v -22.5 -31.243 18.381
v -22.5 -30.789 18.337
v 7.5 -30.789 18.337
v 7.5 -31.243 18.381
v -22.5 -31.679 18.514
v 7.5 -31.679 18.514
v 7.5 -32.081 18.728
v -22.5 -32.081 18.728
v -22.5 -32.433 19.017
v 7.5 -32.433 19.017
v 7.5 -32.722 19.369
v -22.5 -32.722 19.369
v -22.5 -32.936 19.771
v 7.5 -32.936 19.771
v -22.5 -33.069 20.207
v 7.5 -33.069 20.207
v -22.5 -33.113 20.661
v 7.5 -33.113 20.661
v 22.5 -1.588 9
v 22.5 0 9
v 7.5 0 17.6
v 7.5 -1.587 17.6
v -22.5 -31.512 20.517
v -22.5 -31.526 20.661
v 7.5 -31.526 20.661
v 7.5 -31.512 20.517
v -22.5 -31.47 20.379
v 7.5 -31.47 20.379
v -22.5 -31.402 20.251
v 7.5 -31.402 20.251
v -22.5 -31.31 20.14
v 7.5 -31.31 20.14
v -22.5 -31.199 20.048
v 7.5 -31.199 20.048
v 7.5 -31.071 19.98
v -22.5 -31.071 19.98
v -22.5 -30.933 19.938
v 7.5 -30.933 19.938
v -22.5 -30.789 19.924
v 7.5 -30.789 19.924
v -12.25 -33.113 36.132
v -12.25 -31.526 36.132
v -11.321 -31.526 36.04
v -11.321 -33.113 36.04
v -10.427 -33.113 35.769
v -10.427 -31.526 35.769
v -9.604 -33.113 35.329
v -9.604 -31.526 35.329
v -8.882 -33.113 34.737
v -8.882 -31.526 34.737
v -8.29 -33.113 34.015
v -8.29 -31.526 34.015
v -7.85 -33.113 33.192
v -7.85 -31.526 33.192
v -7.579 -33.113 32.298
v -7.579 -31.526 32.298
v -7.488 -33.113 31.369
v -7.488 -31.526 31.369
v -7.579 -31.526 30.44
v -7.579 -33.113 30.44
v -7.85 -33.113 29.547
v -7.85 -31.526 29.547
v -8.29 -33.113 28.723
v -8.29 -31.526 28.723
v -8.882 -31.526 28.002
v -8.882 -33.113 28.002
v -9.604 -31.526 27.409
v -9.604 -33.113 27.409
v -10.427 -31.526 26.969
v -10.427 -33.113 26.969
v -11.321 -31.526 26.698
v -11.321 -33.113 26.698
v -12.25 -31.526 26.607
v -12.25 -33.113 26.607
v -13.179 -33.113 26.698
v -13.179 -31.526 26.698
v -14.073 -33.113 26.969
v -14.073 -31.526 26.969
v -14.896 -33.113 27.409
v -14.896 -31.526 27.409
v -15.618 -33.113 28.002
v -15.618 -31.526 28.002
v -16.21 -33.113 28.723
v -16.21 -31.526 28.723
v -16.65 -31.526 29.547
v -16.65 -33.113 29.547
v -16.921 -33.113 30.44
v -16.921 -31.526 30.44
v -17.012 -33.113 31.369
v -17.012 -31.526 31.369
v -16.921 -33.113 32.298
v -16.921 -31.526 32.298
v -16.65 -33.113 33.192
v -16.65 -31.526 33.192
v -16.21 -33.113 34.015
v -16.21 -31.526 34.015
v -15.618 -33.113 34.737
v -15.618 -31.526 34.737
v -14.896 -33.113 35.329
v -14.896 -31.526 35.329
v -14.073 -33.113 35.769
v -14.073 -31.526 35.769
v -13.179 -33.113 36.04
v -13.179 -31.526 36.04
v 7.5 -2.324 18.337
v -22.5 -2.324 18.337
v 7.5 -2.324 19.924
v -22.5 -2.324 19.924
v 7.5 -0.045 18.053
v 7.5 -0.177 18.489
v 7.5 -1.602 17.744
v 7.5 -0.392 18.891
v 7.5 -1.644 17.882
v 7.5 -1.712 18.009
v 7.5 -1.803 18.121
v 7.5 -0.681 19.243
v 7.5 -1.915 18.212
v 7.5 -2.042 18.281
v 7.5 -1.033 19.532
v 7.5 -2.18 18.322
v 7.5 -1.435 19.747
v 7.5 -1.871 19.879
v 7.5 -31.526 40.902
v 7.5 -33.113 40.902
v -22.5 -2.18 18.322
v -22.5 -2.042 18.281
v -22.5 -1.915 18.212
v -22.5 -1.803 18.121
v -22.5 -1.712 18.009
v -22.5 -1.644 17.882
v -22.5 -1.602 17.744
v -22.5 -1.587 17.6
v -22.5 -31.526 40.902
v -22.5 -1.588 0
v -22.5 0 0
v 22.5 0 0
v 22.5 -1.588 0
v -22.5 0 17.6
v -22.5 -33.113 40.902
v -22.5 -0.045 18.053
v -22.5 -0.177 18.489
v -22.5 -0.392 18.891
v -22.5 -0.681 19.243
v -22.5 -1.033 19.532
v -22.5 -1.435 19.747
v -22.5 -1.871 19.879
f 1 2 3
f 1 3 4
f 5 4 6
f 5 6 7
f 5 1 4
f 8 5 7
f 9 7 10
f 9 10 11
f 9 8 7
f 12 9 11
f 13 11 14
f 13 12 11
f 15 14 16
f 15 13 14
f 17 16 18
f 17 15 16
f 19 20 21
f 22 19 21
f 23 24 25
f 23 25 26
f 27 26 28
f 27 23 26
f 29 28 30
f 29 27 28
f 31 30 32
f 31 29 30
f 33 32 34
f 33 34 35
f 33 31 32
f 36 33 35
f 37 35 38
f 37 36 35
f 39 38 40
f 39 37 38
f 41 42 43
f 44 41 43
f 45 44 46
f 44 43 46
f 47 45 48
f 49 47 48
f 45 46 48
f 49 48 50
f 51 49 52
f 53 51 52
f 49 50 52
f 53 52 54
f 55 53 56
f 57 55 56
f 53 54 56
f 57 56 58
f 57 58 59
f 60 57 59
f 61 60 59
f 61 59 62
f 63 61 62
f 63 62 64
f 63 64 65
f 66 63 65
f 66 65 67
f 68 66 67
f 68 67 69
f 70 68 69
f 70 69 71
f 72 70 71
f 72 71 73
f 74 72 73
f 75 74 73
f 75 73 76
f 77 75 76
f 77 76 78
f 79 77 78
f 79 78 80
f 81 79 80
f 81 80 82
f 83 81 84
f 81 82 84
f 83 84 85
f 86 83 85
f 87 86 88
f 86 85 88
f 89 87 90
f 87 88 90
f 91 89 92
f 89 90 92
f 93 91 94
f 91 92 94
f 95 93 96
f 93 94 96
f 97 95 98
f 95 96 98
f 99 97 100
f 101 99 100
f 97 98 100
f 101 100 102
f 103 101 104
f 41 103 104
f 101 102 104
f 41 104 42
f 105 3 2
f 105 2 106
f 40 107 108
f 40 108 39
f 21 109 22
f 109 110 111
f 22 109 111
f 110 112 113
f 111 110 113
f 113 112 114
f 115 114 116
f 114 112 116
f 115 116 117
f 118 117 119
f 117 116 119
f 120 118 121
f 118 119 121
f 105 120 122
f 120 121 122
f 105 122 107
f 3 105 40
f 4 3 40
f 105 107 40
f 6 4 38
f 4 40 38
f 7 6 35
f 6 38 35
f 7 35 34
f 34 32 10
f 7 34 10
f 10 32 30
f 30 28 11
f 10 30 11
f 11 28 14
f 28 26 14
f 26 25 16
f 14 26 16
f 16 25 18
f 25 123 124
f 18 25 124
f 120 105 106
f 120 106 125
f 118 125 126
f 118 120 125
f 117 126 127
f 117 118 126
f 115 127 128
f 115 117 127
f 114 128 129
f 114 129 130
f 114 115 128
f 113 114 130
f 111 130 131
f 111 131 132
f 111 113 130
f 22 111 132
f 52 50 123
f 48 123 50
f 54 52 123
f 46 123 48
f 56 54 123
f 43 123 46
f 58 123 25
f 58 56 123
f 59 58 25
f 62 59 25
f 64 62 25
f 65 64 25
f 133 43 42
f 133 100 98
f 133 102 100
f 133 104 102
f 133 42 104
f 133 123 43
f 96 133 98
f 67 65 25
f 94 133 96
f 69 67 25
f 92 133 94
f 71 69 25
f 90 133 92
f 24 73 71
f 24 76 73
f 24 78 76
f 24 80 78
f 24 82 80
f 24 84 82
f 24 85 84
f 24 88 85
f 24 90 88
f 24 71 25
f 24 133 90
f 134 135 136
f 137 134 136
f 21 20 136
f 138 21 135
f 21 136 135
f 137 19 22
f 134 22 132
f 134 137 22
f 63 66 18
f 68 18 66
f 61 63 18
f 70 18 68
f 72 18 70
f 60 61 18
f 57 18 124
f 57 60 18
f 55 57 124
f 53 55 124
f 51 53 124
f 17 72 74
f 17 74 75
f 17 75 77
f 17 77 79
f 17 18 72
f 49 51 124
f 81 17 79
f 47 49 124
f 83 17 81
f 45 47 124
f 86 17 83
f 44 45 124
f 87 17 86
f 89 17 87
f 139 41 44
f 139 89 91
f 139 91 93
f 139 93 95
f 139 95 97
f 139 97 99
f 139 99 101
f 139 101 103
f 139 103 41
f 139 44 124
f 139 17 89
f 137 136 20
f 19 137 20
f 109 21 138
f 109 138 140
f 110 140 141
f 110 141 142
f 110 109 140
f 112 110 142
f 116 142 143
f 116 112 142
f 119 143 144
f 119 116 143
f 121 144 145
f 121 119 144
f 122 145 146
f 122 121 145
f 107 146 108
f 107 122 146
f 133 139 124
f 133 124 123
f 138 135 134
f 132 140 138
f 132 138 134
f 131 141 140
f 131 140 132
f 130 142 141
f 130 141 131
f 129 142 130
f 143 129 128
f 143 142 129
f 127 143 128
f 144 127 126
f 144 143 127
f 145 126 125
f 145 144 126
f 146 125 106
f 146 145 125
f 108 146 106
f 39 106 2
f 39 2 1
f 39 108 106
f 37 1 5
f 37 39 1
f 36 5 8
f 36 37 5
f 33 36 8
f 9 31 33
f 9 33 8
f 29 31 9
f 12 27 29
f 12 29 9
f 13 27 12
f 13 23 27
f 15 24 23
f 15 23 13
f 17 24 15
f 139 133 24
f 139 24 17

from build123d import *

# Parameters (mm, degrees)
STACK_CONNECTION_DEPTH       = 1.5875
EDGE_FLANGE1_DEPTH           = 30
EDGE_FLANGE2_STRIP_W         = 7.8232
EDGE_FLANGE2_STRIP_H         = 1.5875
EDGE_FLANGE2_STRIP_CUT_DEPTH = 30
EDGE_FLANGE2_DEPTH           = 30
SKETCH13_R                   = 4.7625
CUT_EXTRUDE1_DEPTH           = 57.330329085


# Sheet-metal steps are written as plain solids
with BuildPart() as part:
    # Sketch2 → Stack Connection (new body)
    with BuildSketch(Plane(origin=(0, 0, 0), x_dir=(1, 0, 0), z_dir=(0, 1, 0))):
        Polygon((-22.5, 0), (22.5, 0), (22.5, -9), (7.5, -17.6), (-22.5, -17.6), (-22.5, -9), align=None)
    extrude(amount=-STACK_CONNECTION_DEPTH)

    # Edge-Flange1 section (across the edge) → Edge-Flange1 (add)
    with BuildSketch(Plane(origin=(7.5, -1.5875, 18.3366), x_dir=(0, 0, -1), z_dir=(-1, 0, 0))):
        with BuildLine():
            Line((-1.5875, 0.7366), (-1.5875, 31.5259))
            Line((-1.5875, 31.5259), (0, 31.5259))
            Line((0, 31.5259), (0, 0.7366))
            ThreePointArc((0, 0.7366), (0.215745145, 0.215745145), (0.7366, 0))
            Line((0.7366, 0), (0.7366, -1.5875))
            ThreePointArc((0.7366, -1.5875), (-0.90678687, -0.90678687), (-1.5875, 0.7366))
        make_face()
    extrude(amount=EDGE_FLANGE1_DEPTH)

    # Edge-Flange2 strip (across the edge) → Edge-Flange2 strip cut (cut)
    with BuildSketch(Plane(origin=(-22.5, -33.1134, 19.9241), x_dir=(0, 1, 0), z_dir=(1, 0, 0))):
        with Locations((-1.5875, -0.79375)):
            Rectangle(EDGE_FLANGE2_STRIP_W, EDGE_FLANGE2_STRIP_H)
    extrude(amount=EDGE_FLANGE2_STRIP_CUT_DEPTH, mode=Mode.SUBTRACT)

    # Edge-Flange2 section (across the edge) → Edge-Flange2 (add)
    with BuildSketch(Plane(origin=(-22.5, -33.1134, 19.9241), x_dir=(0, 1, 0), z_dir=(1, 0, 0))):
        with BuildLine():
            Line((0, 0.7366), (0, 20.9779))
            Line((0, 20.9779), (1.5875, 20.9779))
            Line((1.5875, 20.9779), (1.5875, 0.7366))
            ThreePointArc((1.5875, 0.7366), (1.803245145, 0.215745145), (2.3241, 0))
            Line((2.3241, 0), (2.3241, -1.5875))
            ThreePointArc((2.3241, -1.5875), (0.68071313, -0.90678687), (0, 0.7366))
        make_face()
    extrude(amount=EDGE_FLANGE2_DEPTH)

    # Sketch13 → Cut-Extrude1 (cut, through all)
    with BuildSketch(Plane(origin=(0, -31.5259, 0), x_dir=(1, 0, 0), z_dir=(0, 1, 0))):
        with Locations(Location((-12.25, -31.3693, 0), (0, 0, 270))):
            Circle(SKETCH13_R)
    extrude(amount=-CUT_EXTRUDE1_DEPTH, mode=Mode.SUBTRACT)


solid = part.part
